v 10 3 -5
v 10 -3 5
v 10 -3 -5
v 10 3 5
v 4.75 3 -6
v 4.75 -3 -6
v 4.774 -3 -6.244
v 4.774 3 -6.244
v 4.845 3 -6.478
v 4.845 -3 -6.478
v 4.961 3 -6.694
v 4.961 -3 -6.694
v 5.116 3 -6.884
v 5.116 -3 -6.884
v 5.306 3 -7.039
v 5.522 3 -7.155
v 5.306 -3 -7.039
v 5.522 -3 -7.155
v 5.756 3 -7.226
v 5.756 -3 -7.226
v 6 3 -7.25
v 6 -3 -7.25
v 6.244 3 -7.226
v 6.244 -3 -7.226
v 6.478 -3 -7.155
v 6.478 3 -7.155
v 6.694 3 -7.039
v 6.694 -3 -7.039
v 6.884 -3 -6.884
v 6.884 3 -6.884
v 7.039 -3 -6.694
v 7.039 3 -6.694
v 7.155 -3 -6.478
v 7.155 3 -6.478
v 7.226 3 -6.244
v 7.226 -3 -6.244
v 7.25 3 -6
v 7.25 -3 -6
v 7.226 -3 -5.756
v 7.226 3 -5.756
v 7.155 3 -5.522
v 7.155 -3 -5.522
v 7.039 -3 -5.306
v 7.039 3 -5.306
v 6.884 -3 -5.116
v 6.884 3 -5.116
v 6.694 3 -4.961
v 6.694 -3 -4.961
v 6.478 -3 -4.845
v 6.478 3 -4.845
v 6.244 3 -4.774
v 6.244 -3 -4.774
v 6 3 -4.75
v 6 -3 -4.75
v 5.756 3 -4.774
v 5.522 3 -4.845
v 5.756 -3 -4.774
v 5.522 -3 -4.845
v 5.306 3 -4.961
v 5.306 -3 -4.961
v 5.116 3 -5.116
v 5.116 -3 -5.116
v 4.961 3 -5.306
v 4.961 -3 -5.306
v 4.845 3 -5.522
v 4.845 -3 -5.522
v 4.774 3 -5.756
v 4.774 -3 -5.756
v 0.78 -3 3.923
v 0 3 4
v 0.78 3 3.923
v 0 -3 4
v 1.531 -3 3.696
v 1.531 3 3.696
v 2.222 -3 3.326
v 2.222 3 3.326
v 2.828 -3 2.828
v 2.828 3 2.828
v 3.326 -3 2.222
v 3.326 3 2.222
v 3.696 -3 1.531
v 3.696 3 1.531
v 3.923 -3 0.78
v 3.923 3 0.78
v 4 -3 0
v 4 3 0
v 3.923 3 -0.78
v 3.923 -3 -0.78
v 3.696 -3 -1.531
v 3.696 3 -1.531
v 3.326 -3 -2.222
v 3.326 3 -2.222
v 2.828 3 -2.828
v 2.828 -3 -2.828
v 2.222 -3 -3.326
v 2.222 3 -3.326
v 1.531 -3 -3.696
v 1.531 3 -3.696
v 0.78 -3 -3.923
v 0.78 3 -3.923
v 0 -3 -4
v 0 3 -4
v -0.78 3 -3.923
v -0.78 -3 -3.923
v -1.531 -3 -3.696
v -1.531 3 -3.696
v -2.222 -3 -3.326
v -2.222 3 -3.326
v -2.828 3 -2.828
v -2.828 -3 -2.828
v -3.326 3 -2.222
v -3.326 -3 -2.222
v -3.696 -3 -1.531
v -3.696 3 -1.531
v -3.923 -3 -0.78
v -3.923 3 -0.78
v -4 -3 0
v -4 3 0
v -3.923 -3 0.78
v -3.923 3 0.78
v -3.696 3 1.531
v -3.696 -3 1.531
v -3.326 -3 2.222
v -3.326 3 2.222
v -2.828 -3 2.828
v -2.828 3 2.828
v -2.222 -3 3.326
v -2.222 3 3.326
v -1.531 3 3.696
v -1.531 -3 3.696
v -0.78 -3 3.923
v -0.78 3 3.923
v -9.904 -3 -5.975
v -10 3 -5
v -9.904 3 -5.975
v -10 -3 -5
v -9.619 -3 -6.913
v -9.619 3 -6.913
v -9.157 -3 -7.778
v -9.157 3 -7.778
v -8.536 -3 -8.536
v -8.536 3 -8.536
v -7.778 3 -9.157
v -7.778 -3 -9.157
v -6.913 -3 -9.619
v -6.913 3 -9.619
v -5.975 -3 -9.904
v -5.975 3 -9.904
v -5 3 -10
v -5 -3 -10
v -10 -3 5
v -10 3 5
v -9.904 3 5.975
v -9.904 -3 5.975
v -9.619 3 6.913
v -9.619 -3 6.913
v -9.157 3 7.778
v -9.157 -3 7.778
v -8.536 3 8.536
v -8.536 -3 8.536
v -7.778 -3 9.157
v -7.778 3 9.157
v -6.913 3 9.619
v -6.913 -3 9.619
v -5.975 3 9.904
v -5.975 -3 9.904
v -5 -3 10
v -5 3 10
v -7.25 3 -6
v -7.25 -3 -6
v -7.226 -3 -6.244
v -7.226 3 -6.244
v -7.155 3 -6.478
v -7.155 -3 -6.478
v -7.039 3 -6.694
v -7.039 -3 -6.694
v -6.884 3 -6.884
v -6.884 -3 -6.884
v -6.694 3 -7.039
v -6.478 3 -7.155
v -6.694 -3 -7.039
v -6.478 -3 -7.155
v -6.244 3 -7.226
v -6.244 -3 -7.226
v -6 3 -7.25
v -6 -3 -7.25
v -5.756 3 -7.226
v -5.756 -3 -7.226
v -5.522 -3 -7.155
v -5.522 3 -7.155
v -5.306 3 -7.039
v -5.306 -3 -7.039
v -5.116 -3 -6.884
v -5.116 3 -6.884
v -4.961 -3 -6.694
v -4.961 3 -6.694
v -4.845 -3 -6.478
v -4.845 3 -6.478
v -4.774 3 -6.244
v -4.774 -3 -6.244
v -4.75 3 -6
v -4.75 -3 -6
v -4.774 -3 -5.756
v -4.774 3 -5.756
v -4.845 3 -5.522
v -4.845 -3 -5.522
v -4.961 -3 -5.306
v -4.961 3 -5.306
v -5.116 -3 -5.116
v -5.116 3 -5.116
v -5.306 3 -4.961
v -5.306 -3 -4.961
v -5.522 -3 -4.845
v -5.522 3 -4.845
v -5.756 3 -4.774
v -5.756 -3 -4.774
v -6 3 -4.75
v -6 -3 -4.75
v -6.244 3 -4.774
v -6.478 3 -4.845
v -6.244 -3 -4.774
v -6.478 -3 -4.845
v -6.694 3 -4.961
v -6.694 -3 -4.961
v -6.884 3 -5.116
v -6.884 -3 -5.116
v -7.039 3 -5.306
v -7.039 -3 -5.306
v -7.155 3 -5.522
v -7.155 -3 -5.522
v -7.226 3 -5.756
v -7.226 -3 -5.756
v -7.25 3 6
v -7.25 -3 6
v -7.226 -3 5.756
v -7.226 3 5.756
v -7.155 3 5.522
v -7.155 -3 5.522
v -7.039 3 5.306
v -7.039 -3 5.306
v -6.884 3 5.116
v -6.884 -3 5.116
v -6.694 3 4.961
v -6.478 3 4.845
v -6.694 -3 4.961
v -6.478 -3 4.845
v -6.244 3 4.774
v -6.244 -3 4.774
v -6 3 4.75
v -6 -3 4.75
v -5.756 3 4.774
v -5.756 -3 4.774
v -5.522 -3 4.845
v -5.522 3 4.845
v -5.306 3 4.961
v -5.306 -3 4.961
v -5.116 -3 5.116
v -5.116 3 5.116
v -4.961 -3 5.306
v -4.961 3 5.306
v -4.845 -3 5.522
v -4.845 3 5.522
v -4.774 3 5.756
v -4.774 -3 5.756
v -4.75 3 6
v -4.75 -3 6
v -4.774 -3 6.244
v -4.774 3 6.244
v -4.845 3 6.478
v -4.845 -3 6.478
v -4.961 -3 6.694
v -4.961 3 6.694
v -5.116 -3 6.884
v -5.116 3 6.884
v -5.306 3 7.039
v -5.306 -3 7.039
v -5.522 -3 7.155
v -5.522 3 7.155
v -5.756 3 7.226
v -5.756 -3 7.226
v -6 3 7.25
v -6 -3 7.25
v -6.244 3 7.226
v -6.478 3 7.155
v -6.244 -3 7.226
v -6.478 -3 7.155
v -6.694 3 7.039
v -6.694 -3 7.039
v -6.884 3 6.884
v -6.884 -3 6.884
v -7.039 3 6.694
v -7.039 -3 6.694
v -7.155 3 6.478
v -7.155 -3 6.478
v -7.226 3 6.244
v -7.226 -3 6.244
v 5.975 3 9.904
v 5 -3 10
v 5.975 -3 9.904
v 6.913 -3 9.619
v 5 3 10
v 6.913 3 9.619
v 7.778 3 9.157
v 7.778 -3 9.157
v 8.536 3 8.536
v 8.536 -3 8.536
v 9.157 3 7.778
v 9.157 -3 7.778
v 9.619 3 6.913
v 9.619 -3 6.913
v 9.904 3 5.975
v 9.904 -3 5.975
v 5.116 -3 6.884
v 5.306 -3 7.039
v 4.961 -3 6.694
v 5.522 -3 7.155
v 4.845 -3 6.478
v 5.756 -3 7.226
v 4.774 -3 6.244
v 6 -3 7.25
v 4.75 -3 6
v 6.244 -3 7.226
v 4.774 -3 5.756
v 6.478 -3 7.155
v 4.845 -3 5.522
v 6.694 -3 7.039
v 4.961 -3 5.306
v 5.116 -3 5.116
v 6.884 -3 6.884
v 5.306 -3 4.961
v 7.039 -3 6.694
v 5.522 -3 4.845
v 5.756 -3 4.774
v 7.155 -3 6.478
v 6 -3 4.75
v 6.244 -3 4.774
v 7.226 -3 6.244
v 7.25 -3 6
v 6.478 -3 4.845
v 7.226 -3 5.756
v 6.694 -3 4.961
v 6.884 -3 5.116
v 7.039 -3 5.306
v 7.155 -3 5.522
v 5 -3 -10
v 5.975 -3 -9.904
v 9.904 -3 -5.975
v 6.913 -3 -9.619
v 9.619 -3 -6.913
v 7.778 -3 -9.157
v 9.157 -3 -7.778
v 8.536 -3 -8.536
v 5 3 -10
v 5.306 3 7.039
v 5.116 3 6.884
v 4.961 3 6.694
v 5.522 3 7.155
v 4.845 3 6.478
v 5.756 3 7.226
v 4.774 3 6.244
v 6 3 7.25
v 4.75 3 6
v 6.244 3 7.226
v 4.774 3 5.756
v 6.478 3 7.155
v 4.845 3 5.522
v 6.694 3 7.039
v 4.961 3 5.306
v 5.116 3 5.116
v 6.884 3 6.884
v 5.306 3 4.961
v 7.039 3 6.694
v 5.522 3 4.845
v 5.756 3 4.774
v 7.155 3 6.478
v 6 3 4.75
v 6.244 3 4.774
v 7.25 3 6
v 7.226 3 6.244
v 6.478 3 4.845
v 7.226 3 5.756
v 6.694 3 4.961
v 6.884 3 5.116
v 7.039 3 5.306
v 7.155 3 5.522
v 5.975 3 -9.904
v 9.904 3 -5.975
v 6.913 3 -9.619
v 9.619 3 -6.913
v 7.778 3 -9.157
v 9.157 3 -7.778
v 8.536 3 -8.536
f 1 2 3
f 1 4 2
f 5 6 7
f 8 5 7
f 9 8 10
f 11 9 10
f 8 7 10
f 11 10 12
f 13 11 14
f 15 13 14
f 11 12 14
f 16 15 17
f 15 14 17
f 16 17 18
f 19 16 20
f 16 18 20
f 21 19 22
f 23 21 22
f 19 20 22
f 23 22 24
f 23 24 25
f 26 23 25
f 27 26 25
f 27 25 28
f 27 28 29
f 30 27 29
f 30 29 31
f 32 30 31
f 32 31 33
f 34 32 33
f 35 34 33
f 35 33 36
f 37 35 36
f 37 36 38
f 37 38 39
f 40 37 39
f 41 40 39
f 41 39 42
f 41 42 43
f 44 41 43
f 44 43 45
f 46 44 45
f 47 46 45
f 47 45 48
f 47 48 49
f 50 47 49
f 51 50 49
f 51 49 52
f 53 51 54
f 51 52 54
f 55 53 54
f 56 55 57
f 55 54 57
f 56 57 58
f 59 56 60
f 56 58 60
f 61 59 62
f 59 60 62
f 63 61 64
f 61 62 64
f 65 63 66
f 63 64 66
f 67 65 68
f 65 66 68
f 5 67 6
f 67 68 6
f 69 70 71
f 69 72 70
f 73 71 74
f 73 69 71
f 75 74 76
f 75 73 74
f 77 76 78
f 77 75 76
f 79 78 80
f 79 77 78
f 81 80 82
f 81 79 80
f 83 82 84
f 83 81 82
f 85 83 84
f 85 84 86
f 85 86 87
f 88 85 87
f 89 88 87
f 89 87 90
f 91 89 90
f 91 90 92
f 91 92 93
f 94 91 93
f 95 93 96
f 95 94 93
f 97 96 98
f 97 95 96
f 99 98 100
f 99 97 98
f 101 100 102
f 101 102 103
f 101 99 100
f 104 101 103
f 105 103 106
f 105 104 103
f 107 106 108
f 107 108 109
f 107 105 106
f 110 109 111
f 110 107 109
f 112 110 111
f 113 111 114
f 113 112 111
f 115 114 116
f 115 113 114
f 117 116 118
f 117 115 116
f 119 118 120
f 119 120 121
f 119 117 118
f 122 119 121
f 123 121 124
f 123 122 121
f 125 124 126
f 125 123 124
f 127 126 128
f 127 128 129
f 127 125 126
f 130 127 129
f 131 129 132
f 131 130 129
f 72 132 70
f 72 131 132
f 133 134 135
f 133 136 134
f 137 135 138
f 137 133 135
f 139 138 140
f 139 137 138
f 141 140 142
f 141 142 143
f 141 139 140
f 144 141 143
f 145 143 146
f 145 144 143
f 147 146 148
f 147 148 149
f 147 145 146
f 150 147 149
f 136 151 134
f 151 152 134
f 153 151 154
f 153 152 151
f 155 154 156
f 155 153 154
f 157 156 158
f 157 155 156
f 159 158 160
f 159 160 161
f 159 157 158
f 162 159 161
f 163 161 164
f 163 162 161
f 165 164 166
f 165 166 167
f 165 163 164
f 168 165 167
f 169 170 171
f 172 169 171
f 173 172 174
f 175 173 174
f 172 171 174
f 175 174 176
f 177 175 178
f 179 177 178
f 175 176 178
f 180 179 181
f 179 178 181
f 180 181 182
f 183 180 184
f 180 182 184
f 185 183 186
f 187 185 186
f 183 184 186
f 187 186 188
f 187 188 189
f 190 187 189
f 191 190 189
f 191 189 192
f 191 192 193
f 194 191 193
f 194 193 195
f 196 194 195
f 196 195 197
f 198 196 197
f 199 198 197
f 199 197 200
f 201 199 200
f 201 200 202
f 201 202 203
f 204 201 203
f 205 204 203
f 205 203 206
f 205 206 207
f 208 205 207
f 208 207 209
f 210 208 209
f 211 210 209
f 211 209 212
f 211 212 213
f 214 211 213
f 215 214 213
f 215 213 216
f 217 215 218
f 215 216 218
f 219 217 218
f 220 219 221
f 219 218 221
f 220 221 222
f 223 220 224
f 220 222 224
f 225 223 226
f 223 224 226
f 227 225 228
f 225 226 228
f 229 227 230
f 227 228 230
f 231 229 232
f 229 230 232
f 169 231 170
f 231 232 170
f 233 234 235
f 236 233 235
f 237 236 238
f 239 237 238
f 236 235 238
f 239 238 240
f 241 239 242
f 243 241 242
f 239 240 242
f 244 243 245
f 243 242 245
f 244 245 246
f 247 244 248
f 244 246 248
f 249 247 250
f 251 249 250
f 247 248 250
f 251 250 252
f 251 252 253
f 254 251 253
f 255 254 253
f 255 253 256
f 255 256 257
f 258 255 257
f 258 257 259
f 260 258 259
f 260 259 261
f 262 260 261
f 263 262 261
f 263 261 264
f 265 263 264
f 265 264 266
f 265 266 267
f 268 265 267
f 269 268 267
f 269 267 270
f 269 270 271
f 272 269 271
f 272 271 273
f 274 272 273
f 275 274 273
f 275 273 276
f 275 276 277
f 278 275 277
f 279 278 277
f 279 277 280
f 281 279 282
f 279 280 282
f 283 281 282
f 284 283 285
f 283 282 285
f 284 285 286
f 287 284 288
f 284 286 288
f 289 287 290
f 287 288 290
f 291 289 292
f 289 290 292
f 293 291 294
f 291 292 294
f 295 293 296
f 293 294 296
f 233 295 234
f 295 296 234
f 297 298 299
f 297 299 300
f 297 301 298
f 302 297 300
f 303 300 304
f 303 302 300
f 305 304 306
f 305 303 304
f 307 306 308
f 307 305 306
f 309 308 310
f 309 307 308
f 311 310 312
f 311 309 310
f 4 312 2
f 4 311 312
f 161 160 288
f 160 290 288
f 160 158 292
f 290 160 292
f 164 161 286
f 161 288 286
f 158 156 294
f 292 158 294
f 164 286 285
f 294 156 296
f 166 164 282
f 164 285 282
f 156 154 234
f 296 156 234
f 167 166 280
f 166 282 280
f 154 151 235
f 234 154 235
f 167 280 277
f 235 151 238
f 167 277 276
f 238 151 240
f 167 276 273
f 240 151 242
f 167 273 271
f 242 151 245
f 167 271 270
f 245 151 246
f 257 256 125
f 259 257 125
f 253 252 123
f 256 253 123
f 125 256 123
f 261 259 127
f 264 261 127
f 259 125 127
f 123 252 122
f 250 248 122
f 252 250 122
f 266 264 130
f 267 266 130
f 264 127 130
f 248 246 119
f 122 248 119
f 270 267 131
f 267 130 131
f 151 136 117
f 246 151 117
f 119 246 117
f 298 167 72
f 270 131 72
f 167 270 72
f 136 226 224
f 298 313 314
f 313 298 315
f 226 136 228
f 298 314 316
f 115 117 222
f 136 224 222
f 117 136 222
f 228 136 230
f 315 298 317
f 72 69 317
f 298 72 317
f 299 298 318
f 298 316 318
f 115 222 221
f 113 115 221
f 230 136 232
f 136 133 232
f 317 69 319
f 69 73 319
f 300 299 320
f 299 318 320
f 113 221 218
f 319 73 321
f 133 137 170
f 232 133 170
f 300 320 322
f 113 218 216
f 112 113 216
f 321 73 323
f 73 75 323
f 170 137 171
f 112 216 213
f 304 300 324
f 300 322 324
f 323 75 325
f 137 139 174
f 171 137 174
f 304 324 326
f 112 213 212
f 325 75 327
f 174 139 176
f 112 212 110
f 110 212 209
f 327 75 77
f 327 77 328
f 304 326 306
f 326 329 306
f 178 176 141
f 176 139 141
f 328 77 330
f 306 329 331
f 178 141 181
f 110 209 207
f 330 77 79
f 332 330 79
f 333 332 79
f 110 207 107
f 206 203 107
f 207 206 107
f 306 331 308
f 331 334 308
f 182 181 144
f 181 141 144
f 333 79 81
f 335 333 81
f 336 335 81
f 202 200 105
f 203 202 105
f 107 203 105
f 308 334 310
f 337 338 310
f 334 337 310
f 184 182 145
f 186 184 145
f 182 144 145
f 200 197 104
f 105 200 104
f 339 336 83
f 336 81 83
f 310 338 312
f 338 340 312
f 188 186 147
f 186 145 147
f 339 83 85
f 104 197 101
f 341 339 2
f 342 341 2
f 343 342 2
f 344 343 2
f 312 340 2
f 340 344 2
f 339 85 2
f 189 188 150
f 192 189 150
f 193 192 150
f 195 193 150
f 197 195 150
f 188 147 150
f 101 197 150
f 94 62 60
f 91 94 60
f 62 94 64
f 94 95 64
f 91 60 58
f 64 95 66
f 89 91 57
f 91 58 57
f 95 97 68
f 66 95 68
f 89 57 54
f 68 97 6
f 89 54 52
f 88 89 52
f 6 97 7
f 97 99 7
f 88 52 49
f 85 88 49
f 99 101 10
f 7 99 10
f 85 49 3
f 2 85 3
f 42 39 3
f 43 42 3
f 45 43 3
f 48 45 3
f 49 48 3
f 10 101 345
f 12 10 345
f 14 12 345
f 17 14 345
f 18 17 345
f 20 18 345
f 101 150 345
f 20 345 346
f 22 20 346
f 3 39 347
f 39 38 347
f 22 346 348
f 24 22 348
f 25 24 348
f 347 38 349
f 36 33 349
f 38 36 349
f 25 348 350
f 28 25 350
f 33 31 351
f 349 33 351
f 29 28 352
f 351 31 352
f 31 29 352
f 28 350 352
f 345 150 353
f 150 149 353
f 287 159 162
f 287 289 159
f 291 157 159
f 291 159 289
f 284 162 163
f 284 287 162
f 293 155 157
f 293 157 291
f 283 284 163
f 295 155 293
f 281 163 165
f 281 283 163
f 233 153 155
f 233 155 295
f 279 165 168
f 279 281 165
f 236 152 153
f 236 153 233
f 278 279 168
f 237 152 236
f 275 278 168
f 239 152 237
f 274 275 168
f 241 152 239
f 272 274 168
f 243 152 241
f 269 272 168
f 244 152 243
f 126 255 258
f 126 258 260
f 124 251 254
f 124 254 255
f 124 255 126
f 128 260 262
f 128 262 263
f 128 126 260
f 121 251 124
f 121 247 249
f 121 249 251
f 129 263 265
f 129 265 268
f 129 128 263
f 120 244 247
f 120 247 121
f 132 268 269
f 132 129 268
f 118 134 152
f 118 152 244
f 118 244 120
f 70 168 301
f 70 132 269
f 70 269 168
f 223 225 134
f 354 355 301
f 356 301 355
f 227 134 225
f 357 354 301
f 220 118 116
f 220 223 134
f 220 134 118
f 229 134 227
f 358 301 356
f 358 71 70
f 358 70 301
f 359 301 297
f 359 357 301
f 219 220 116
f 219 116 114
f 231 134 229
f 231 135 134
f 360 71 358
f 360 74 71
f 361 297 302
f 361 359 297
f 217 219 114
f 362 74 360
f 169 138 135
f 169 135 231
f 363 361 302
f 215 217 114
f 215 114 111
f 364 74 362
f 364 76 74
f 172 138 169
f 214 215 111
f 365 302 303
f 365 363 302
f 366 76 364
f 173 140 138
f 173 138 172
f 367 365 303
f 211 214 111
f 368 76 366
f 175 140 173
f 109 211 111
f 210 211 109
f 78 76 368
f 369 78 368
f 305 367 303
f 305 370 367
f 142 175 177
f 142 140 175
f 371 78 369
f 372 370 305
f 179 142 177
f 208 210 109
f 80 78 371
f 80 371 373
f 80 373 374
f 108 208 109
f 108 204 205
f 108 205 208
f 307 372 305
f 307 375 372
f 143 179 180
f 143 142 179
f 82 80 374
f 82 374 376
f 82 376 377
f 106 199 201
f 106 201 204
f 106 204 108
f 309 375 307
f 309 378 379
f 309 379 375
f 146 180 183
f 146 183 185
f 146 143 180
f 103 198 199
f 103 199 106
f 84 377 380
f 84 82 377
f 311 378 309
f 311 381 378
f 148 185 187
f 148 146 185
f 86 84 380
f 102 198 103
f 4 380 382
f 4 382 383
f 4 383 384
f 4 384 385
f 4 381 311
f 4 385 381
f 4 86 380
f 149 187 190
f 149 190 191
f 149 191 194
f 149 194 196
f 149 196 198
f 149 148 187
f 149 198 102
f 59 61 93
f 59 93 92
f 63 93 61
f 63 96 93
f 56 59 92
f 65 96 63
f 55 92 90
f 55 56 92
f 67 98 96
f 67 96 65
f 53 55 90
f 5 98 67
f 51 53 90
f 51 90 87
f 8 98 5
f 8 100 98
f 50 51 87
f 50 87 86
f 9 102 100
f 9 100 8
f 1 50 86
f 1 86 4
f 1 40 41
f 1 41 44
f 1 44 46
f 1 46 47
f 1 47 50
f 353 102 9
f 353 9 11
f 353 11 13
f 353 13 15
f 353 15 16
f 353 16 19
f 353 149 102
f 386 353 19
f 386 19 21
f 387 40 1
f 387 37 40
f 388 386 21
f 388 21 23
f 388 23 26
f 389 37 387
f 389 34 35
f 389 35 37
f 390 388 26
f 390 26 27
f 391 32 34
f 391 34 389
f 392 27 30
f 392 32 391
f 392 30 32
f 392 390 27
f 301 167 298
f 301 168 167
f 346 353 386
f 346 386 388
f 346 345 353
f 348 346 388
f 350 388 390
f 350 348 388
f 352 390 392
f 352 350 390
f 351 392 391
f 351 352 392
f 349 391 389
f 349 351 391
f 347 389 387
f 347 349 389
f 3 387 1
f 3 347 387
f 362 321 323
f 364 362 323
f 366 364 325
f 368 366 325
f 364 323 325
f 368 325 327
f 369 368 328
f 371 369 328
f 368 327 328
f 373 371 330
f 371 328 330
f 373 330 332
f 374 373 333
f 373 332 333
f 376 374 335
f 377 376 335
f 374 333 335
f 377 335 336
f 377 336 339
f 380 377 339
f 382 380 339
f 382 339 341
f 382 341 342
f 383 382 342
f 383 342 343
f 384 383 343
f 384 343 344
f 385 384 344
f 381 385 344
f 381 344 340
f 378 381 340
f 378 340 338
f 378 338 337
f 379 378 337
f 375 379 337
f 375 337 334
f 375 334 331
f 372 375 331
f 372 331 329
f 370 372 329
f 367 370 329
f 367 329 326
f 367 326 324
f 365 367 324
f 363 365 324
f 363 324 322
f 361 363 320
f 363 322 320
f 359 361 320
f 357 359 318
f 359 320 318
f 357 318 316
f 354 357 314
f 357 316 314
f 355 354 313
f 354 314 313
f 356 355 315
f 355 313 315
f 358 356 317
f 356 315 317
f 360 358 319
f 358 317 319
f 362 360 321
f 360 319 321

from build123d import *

# Parameters (mm, degrees)
CROQUIS1_W                = 20
CROQUIS1_H                = 20
CROQUIS1_R                = 4
SALIENTE_EXTRUIR1_DEPTH   = 3
TALADRO_ROSCADO_M3X0_52_D = 2.5
REDONDEO1_R               = 5


with BuildPart() as part:
    # Croquis1 → Saliente-Extruir1 (new, symmetric)
    with BuildSketch(Plane(origin=(0, 0, 0), x_dir=(1, 0, 0), z_dir=(0, 1, 0))):
        Rectangle(CROQUIS1_W, CROQUIS1_H)
        with Locations(Location((0, 0, 0), (0, 0, 270))):
            Circle(CROQUIS1_R, mode=Mode.SUBTRACT)
    extrude(amount=SALIENTE_EXTRUIR1_DEPTH, both=True)

    # Taladro roscado M3x0.52 (through all)
    with Locations(Plane(origin=(0, 3, 0), x_dir=(1, 0, 0), z_dir=(0, 1, 0))):
        with Locations((6, 6), (-6, 6), (-6, -6), (6, -6)):
            Hole(TALADRO_ROSCADO_M3X0_52_D / 2)

    # Redondeo1
    redondeo1_edges = [part.edges().sort_by_distance(p)[0] for p in [
        (10, 0, 10),
        (-10, 0, 10),
        (-10, 0, -10),
        (10, 0, -10),
    ]]
    fillet(redondeo1_edges, radius=REDONDEO1_R)


solid = part.part
